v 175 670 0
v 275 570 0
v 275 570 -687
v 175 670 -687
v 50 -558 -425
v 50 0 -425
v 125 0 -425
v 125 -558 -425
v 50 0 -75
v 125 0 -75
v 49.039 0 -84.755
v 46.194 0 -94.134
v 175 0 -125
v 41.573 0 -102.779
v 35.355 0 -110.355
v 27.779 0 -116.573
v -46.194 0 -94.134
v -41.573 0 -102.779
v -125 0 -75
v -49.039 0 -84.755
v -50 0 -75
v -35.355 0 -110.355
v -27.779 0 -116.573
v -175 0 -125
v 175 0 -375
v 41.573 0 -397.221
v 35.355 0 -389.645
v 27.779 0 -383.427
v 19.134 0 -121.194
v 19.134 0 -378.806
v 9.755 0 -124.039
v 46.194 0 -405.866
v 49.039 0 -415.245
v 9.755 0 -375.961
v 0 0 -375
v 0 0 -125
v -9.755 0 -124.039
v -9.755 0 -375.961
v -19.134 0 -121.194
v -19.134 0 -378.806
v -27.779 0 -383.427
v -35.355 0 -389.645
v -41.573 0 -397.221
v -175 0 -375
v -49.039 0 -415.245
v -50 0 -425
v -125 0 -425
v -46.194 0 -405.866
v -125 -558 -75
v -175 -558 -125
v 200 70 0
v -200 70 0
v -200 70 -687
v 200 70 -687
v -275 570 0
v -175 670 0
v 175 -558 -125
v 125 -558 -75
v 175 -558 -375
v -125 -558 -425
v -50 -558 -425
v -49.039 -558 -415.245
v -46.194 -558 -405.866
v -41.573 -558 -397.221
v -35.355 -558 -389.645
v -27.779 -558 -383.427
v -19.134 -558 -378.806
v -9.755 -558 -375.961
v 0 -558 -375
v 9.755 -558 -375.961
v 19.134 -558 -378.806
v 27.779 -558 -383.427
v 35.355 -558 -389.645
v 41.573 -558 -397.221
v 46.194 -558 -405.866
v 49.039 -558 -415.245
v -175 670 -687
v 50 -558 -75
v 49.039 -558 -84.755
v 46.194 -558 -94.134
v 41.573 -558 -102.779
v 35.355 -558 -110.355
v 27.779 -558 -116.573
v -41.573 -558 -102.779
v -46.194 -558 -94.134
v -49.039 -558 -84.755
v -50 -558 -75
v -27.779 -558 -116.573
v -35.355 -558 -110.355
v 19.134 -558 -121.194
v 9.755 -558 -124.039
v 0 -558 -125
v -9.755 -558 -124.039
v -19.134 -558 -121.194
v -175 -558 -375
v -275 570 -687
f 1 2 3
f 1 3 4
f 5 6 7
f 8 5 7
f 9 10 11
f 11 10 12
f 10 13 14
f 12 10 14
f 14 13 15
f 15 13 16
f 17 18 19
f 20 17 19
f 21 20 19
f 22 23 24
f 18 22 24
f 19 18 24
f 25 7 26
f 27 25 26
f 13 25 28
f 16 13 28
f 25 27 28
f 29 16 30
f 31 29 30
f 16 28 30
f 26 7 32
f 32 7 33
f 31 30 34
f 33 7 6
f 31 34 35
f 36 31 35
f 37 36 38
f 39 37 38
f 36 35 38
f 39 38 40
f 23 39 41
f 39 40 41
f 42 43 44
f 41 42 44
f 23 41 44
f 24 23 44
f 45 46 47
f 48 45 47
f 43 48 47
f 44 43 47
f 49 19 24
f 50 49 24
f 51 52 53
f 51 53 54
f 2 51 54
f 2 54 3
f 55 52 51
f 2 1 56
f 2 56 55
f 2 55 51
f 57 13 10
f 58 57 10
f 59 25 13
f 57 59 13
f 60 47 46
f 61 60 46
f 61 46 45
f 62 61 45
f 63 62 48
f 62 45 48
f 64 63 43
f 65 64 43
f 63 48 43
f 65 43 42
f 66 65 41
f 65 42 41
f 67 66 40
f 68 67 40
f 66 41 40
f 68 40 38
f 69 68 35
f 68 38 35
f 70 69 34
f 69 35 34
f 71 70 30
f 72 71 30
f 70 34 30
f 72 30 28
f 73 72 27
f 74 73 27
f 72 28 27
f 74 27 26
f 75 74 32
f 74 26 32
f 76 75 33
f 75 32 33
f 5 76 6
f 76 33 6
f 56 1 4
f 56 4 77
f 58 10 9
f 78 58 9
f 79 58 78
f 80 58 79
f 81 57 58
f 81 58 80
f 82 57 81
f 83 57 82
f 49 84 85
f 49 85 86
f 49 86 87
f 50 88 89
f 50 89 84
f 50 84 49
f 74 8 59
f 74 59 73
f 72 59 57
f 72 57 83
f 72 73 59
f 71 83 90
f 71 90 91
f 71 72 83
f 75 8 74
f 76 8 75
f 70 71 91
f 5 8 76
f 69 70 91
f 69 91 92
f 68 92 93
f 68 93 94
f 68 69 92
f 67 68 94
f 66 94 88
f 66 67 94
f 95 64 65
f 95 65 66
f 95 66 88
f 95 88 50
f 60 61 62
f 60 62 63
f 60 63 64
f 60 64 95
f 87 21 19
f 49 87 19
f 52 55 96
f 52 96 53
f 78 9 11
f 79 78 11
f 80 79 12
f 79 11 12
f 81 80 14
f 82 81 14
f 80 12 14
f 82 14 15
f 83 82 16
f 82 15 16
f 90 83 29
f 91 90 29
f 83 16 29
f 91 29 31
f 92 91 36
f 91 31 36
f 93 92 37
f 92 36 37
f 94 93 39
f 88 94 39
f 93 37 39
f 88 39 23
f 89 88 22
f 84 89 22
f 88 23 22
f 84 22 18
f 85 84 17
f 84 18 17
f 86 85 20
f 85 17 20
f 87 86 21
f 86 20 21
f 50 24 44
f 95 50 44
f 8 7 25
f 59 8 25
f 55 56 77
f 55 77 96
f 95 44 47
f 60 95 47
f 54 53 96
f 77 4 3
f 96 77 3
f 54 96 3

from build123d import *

# Parameters (mm, degrees)
RESSALTO_EXTRUS_O1_DEPTH = 687
RESSALTO_EXTRUS_O2_DEPTH = 558


with BuildPart() as part:
    # Esboço6 → Ressalto-extrusão1 (new body)
    with BuildSketch(Plane.XY):
        Polygon((-200, 70), (200, 70), (275, 570), (175, 670), (-175, 670), (-275, 570), align=None)
    extrude(amount=-RESSALTO_EXTRUS_O1_DEPTH)


with BuildPart() as body_2:
    # Esboço10 → Ressalto-extrusão2 (new body)
    with BuildSketch(Plane(origin=(0, 0, 0), x_dir=(1, 0, 0), z_dir=(0, 1, 0))):
        with BuildLine():
            Line((-175, 375), (-125, 425))
            Line((-125, 425), (-50, 425))
            ThreePointArc((-50, 425), (0, 375), (50, 425))
            Line((50, 425), (125, 425))
            Line((125, 425), (175, 375))
            Line((175, 375), (175, 125))
            Line((175, 125), (125, 75))
            Line((125, 75), (50, 75))
            ThreePointArc((50, 75), (0, 125), (-50, 75))
            Line((-50, 75), (-125, 75))
            Line((-125, 75), (-175, 125))
            Line((-175, 125), (-175, 375))
        make_face()
    extrude(amount=-RESSALTO_EXTRUS_O2_DEPTH)


solid = Compound([part.part, body_2.part])
